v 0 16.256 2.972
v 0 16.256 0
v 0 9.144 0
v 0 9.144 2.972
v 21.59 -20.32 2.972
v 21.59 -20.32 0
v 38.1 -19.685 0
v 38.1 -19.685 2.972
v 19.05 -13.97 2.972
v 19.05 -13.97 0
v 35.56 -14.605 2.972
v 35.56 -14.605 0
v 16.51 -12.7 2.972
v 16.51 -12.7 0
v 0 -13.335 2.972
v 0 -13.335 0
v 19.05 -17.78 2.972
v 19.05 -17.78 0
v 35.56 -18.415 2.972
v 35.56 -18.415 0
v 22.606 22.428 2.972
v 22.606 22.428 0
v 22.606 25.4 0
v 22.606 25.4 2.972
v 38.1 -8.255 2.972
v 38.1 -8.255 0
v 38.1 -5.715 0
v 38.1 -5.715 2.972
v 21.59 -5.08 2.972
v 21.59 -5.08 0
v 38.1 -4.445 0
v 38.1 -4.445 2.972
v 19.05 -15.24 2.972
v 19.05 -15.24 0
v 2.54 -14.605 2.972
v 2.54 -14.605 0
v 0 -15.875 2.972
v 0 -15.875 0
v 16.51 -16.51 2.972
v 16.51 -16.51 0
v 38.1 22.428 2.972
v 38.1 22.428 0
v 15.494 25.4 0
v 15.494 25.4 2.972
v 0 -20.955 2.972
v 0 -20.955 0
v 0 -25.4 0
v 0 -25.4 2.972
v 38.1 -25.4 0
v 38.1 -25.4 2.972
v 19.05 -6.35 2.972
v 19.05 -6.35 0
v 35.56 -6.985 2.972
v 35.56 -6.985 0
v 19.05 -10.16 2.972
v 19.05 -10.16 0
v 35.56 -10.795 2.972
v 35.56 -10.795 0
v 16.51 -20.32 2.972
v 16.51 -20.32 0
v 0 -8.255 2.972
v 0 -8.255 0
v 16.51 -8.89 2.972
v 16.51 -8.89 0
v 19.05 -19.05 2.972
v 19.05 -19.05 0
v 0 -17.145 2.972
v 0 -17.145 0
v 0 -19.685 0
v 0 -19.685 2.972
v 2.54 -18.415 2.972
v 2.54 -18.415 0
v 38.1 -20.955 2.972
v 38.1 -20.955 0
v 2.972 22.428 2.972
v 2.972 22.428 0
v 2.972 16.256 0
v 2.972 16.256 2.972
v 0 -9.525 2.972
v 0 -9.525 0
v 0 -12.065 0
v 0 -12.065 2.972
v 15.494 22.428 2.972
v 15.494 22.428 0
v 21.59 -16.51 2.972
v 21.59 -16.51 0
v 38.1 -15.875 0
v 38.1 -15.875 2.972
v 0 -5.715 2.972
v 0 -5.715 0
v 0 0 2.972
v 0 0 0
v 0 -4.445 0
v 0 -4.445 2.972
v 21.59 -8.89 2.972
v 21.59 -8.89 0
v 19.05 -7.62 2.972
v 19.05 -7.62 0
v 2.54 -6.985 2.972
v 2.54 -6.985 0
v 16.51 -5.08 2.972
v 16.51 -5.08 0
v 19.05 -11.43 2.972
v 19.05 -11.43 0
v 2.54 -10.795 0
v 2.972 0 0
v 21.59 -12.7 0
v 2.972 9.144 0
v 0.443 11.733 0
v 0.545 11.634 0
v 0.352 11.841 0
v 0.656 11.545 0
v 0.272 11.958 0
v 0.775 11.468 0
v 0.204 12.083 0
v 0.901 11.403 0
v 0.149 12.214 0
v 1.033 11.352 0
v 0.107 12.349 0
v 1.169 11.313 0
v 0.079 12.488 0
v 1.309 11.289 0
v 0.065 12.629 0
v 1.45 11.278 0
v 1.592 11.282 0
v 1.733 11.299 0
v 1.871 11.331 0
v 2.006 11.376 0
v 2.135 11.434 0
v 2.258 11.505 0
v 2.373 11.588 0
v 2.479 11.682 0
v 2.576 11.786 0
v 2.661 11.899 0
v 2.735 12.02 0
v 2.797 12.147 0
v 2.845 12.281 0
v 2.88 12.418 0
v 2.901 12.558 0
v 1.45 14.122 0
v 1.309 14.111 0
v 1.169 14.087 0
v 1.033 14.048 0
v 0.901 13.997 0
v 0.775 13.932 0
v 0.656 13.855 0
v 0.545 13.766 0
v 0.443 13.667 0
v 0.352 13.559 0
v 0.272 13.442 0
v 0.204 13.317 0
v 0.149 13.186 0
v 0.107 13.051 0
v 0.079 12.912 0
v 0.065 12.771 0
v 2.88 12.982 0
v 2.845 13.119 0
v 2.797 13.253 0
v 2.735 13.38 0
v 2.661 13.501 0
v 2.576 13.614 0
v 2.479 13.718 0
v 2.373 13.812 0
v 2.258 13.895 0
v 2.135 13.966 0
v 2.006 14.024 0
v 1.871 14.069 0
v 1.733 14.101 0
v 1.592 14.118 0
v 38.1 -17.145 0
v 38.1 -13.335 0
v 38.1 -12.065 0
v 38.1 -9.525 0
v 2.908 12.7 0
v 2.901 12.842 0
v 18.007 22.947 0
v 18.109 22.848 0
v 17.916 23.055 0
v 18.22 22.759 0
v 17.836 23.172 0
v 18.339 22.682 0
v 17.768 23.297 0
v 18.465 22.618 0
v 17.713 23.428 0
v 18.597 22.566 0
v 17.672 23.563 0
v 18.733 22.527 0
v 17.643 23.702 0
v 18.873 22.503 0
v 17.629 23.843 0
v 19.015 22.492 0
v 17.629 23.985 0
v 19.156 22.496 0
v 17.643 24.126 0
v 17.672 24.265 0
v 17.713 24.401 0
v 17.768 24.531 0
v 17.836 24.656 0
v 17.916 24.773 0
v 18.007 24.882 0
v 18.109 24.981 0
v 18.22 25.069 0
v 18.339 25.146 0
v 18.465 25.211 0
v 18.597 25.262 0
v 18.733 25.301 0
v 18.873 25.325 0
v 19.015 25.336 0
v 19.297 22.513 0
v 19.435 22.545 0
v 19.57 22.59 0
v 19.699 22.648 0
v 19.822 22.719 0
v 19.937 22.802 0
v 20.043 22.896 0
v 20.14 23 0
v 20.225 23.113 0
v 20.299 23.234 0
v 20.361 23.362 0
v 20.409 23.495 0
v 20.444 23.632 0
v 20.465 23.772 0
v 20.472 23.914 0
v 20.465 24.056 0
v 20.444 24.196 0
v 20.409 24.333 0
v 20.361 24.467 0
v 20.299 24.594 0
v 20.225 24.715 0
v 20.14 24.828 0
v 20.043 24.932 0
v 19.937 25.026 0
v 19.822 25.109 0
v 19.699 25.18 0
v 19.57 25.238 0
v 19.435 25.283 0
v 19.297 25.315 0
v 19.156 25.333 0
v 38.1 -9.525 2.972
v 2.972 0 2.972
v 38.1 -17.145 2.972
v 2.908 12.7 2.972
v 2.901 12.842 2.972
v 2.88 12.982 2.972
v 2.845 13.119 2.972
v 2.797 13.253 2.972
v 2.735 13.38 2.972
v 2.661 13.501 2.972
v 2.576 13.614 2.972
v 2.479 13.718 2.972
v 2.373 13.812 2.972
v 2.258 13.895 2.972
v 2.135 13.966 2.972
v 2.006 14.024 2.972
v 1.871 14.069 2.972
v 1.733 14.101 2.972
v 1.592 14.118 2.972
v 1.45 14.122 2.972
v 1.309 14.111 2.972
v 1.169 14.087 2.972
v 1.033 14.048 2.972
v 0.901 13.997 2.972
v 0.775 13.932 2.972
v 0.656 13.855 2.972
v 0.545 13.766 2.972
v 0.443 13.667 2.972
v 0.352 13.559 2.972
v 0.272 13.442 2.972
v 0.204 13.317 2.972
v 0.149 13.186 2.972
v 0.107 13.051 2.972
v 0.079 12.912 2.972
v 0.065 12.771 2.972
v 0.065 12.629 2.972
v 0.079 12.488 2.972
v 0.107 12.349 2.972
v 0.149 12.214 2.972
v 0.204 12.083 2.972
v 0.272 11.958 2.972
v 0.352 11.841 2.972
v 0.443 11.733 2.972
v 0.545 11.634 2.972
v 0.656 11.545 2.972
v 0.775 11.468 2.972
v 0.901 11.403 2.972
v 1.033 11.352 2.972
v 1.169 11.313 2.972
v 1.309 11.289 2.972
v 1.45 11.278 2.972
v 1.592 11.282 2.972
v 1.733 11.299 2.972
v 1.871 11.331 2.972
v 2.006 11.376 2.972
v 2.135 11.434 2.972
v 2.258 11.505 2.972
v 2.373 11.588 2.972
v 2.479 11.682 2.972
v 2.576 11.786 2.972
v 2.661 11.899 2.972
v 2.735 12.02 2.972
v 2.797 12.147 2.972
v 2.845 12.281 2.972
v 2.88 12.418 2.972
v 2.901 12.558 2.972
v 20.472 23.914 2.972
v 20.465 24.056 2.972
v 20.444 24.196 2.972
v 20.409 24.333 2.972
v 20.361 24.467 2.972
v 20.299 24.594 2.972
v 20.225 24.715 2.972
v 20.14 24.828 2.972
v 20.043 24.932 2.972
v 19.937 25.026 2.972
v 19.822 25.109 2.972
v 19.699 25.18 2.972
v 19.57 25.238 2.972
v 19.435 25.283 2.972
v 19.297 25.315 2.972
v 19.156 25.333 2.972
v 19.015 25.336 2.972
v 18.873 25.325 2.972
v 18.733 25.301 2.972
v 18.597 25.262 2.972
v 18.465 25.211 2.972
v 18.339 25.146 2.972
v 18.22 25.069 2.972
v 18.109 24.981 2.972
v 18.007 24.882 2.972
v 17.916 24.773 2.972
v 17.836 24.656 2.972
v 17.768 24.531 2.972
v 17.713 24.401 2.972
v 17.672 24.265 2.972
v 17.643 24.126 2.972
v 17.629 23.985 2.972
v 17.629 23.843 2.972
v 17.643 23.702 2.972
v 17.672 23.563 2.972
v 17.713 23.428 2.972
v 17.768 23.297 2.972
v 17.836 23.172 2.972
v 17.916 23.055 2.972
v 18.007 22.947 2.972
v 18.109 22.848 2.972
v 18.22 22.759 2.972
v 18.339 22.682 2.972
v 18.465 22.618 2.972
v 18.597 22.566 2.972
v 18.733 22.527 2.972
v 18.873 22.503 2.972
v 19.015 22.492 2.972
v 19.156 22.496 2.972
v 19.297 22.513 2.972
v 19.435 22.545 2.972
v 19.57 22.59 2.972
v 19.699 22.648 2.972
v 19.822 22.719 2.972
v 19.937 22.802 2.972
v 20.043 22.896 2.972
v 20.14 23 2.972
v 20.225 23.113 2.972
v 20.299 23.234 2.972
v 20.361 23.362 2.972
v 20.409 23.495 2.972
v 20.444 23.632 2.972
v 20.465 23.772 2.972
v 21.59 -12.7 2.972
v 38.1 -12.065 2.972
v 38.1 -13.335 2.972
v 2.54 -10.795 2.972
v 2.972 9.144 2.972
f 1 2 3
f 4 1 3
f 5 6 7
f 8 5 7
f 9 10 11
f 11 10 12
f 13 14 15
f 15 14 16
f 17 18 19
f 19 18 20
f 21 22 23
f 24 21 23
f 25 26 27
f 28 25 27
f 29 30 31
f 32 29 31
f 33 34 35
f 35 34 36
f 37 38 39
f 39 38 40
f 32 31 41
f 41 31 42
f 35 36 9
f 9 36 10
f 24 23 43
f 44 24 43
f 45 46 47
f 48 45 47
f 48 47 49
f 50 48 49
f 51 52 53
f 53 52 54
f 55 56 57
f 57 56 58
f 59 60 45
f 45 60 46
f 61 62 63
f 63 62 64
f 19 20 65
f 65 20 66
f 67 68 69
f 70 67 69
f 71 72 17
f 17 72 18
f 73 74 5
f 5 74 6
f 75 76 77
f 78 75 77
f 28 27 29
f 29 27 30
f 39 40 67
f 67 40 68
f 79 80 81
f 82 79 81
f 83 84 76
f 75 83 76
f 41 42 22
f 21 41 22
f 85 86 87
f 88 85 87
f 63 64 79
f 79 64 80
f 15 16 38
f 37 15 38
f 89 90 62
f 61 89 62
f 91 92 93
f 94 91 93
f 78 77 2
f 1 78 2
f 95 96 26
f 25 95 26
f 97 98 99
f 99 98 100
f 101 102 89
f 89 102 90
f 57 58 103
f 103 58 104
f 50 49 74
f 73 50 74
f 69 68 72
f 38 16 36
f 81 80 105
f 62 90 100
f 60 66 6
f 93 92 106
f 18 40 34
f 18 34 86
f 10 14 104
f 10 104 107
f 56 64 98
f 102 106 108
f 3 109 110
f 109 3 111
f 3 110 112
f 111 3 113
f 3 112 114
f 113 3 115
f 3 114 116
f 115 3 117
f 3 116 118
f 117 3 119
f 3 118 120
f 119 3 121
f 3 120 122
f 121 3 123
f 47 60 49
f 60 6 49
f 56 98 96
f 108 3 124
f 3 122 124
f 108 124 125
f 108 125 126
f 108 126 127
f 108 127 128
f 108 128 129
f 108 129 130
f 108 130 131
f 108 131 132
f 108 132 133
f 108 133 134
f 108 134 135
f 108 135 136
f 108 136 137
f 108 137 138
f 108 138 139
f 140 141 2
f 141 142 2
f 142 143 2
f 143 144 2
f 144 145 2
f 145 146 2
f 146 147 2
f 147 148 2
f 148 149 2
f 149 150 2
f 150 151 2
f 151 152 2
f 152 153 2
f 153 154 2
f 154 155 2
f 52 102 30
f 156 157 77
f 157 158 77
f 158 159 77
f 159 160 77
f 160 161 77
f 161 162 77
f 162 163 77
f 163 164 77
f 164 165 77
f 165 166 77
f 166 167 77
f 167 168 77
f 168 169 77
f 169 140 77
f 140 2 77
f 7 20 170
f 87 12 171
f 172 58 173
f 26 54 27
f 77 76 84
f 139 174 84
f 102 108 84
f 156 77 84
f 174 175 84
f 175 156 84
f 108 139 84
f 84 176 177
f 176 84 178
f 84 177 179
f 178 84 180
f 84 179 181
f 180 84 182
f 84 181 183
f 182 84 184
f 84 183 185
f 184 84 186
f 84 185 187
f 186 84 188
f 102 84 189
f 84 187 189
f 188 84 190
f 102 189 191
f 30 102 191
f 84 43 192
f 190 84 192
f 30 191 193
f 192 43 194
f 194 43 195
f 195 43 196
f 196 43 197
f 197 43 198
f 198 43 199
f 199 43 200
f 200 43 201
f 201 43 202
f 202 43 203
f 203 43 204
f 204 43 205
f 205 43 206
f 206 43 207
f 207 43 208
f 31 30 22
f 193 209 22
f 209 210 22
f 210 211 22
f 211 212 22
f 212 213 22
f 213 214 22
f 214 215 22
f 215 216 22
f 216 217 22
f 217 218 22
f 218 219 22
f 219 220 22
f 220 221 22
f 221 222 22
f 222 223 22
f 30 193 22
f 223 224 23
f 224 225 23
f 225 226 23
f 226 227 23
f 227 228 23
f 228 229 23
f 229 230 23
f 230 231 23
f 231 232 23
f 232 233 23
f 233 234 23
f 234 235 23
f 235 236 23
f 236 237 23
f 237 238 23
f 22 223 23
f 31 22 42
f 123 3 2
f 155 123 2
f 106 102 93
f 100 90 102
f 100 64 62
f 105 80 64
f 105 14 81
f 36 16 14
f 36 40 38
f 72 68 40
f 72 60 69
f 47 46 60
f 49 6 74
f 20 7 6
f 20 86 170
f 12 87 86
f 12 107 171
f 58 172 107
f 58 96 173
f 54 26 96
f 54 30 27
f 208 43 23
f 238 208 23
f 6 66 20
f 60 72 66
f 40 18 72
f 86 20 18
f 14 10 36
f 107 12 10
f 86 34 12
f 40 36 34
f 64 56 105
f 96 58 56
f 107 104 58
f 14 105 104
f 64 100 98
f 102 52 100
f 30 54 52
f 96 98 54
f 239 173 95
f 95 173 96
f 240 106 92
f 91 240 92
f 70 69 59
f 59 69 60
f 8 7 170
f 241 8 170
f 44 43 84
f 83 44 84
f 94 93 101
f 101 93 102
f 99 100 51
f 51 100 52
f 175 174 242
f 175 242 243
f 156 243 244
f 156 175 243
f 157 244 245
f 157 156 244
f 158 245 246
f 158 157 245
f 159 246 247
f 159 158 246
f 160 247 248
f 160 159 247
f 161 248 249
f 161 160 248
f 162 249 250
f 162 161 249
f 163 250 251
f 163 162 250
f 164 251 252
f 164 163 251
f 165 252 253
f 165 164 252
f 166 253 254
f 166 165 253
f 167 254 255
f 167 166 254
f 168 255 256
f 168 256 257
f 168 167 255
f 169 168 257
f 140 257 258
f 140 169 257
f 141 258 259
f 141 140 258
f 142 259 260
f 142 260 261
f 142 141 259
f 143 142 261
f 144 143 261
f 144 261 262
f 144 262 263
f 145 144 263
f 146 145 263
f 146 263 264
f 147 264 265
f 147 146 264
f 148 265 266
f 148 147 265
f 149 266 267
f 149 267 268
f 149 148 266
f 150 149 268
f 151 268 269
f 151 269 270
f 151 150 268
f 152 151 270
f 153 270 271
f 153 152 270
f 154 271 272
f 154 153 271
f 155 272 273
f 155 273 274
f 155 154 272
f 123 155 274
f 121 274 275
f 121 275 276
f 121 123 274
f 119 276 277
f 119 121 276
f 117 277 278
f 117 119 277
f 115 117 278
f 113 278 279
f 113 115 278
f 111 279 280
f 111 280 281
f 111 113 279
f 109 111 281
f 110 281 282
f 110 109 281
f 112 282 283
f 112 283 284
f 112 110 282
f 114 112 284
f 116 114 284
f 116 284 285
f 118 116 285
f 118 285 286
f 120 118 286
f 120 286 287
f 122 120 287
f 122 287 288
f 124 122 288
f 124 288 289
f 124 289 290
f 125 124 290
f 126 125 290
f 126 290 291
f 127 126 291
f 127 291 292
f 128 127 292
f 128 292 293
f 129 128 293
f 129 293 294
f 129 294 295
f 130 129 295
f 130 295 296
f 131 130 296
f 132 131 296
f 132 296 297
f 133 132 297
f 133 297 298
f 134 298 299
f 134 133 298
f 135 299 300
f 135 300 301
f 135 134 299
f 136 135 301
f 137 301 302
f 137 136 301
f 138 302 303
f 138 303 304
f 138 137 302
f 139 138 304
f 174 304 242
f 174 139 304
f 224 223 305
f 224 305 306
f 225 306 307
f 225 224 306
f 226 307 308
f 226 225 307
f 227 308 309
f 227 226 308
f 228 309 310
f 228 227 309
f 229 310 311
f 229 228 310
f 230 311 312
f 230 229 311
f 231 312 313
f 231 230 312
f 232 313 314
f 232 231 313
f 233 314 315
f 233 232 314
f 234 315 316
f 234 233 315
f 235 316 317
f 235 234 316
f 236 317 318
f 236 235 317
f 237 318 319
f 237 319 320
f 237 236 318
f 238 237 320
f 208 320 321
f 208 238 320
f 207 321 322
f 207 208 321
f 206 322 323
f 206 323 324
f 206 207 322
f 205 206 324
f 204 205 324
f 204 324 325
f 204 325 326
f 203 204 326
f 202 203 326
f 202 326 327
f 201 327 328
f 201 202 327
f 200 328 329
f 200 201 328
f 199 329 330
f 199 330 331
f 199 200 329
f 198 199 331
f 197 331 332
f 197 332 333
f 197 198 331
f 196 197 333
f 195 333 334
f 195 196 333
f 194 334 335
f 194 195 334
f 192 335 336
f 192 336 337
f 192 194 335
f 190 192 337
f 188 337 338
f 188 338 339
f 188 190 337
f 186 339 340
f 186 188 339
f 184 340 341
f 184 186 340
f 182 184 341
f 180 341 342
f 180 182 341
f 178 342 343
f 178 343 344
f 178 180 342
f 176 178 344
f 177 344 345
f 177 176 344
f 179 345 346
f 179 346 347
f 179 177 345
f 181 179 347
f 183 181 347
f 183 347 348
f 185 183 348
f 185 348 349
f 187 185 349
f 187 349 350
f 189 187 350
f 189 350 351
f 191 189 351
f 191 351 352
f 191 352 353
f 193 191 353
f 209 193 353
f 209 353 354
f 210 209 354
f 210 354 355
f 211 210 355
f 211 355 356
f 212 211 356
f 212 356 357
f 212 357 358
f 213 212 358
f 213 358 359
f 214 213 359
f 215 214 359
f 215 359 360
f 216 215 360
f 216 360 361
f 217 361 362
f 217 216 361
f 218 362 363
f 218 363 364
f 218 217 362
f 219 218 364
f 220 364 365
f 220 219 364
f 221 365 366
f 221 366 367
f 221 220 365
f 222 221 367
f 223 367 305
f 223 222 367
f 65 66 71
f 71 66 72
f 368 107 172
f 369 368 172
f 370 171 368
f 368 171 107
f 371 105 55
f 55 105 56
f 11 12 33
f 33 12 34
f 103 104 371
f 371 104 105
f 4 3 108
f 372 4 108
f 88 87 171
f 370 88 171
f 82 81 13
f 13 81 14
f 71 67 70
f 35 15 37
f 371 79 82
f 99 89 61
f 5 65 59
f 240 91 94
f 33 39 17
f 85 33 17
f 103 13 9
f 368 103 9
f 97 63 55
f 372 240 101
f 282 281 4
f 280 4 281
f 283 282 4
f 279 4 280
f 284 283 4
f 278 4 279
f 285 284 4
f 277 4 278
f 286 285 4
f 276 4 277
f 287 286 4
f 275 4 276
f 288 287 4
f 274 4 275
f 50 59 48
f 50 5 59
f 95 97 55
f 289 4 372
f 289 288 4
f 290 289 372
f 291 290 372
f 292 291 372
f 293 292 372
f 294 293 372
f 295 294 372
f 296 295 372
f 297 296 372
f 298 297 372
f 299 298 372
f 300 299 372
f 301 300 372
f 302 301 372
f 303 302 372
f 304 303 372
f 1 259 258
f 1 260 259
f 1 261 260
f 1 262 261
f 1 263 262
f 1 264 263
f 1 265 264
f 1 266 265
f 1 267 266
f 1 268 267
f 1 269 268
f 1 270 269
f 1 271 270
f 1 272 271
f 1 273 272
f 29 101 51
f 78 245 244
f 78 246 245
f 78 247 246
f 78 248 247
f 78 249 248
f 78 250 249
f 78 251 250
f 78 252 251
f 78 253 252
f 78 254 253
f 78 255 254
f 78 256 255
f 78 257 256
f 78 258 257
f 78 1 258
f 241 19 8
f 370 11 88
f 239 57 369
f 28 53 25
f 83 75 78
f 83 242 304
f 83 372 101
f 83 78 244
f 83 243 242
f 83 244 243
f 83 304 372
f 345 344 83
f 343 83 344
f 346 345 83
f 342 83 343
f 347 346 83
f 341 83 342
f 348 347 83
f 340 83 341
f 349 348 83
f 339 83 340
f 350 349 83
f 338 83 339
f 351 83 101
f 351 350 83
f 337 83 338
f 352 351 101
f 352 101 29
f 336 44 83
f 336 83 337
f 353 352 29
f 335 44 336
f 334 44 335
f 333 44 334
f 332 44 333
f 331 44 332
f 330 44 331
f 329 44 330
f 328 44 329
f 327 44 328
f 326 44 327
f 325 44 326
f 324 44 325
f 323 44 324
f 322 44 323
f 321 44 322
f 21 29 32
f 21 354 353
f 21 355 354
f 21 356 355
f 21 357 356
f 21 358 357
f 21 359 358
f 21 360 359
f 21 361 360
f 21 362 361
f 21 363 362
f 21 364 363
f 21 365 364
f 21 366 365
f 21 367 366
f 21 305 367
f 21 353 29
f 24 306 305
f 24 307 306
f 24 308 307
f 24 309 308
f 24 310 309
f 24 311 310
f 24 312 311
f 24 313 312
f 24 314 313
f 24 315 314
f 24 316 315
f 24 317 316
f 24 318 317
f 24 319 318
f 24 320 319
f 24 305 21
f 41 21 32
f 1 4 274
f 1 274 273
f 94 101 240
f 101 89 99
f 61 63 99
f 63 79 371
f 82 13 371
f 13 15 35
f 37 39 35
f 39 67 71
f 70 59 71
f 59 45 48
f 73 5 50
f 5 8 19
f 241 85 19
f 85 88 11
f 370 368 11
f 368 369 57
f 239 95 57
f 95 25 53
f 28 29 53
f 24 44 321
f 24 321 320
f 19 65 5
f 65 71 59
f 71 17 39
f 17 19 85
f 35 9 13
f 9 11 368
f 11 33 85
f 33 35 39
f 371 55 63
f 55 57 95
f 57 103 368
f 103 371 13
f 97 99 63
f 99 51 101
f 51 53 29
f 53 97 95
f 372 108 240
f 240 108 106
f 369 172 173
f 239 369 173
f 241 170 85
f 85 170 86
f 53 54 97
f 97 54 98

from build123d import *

# Parameters (mm, degrees)
SKETCH1_R           = 1.4224
BOSS_EXTRUDE7_DEPTH = 2.9718


with BuildPart() as part:
    # Sketch1 → Boss-Extrude7 (new body)
    with BuildSketch(Plane.XY):
        Polygon((15.494, 22.4282), (2.9718, 22.4282), (2.9718, 16.256), (0, 16.256), (0, 9.144), (2.9718, 9.144), (2.9718, 0), (0, 0), (0, -4.445), (16.51, -5.08), (0, -5.715), (0, -8.255), (16.51, -8.89), (0, -9.525), (0, -12.065), (16.51, -12.7), (0, -13.335), (0, -15.875), (16.51, -16.51), (0, -17.145), (0, -19.685), (16.51, -20.32), (0, -20.955), (0, -25.4), (38.1, -25.4), (38.1, -20.955), (21.59, -20.32), (38.1, -19.685), (38.1, -17.145), (21.59, -16.51), (38.1, -15.875), (38.1, -13.335), (21.59, -12.7), (38.1, -12.065), (38.1, -9.525), (21.59, -8.89), (38.1, -8.255), (38.1, -5.715), (21.59, -5.08), (38.1, -4.445), (38.1, 22.4282), (22.606, 22.4282), (22.606, 25.4), (15.494, 25.4), align=None)
        with Locations((1.4859, 12.7)):
            Circle(SKETCH1_R, mode=Mode.SUBTRACT)
        with Locations((19.05, 23.9141)):
            Circle(SKETCH1_R, mode=Mode.SUBTRACT)
        Polygon((2.54, -6.985), (19.05, -6.35), (35.56, -6.985), (19.05, -7.62), align=None, mode=Mode.SUBTRACT)
        Polygon((19.05, -19.05), (2.54, -18.415), (19.05, -17.78), (35.56, -18.415), align=None, mode=Mode.SUBTRACT)
        Polygon((19.05, -13.97), (35.56, -14.605), (19.05, -15.24), (2.54, -14.605), align=None, mode=Mode.SUBTRACT)
        Polygon((19.05, -10.16), (35.56, -10.795), (19.05, -11.43), (2.54, -10.795), align=None, mode=Mode.SUBTRACT)
    extrude(amount=BOSS_EXTRUDE7_DEPTH)


solid = part.part
